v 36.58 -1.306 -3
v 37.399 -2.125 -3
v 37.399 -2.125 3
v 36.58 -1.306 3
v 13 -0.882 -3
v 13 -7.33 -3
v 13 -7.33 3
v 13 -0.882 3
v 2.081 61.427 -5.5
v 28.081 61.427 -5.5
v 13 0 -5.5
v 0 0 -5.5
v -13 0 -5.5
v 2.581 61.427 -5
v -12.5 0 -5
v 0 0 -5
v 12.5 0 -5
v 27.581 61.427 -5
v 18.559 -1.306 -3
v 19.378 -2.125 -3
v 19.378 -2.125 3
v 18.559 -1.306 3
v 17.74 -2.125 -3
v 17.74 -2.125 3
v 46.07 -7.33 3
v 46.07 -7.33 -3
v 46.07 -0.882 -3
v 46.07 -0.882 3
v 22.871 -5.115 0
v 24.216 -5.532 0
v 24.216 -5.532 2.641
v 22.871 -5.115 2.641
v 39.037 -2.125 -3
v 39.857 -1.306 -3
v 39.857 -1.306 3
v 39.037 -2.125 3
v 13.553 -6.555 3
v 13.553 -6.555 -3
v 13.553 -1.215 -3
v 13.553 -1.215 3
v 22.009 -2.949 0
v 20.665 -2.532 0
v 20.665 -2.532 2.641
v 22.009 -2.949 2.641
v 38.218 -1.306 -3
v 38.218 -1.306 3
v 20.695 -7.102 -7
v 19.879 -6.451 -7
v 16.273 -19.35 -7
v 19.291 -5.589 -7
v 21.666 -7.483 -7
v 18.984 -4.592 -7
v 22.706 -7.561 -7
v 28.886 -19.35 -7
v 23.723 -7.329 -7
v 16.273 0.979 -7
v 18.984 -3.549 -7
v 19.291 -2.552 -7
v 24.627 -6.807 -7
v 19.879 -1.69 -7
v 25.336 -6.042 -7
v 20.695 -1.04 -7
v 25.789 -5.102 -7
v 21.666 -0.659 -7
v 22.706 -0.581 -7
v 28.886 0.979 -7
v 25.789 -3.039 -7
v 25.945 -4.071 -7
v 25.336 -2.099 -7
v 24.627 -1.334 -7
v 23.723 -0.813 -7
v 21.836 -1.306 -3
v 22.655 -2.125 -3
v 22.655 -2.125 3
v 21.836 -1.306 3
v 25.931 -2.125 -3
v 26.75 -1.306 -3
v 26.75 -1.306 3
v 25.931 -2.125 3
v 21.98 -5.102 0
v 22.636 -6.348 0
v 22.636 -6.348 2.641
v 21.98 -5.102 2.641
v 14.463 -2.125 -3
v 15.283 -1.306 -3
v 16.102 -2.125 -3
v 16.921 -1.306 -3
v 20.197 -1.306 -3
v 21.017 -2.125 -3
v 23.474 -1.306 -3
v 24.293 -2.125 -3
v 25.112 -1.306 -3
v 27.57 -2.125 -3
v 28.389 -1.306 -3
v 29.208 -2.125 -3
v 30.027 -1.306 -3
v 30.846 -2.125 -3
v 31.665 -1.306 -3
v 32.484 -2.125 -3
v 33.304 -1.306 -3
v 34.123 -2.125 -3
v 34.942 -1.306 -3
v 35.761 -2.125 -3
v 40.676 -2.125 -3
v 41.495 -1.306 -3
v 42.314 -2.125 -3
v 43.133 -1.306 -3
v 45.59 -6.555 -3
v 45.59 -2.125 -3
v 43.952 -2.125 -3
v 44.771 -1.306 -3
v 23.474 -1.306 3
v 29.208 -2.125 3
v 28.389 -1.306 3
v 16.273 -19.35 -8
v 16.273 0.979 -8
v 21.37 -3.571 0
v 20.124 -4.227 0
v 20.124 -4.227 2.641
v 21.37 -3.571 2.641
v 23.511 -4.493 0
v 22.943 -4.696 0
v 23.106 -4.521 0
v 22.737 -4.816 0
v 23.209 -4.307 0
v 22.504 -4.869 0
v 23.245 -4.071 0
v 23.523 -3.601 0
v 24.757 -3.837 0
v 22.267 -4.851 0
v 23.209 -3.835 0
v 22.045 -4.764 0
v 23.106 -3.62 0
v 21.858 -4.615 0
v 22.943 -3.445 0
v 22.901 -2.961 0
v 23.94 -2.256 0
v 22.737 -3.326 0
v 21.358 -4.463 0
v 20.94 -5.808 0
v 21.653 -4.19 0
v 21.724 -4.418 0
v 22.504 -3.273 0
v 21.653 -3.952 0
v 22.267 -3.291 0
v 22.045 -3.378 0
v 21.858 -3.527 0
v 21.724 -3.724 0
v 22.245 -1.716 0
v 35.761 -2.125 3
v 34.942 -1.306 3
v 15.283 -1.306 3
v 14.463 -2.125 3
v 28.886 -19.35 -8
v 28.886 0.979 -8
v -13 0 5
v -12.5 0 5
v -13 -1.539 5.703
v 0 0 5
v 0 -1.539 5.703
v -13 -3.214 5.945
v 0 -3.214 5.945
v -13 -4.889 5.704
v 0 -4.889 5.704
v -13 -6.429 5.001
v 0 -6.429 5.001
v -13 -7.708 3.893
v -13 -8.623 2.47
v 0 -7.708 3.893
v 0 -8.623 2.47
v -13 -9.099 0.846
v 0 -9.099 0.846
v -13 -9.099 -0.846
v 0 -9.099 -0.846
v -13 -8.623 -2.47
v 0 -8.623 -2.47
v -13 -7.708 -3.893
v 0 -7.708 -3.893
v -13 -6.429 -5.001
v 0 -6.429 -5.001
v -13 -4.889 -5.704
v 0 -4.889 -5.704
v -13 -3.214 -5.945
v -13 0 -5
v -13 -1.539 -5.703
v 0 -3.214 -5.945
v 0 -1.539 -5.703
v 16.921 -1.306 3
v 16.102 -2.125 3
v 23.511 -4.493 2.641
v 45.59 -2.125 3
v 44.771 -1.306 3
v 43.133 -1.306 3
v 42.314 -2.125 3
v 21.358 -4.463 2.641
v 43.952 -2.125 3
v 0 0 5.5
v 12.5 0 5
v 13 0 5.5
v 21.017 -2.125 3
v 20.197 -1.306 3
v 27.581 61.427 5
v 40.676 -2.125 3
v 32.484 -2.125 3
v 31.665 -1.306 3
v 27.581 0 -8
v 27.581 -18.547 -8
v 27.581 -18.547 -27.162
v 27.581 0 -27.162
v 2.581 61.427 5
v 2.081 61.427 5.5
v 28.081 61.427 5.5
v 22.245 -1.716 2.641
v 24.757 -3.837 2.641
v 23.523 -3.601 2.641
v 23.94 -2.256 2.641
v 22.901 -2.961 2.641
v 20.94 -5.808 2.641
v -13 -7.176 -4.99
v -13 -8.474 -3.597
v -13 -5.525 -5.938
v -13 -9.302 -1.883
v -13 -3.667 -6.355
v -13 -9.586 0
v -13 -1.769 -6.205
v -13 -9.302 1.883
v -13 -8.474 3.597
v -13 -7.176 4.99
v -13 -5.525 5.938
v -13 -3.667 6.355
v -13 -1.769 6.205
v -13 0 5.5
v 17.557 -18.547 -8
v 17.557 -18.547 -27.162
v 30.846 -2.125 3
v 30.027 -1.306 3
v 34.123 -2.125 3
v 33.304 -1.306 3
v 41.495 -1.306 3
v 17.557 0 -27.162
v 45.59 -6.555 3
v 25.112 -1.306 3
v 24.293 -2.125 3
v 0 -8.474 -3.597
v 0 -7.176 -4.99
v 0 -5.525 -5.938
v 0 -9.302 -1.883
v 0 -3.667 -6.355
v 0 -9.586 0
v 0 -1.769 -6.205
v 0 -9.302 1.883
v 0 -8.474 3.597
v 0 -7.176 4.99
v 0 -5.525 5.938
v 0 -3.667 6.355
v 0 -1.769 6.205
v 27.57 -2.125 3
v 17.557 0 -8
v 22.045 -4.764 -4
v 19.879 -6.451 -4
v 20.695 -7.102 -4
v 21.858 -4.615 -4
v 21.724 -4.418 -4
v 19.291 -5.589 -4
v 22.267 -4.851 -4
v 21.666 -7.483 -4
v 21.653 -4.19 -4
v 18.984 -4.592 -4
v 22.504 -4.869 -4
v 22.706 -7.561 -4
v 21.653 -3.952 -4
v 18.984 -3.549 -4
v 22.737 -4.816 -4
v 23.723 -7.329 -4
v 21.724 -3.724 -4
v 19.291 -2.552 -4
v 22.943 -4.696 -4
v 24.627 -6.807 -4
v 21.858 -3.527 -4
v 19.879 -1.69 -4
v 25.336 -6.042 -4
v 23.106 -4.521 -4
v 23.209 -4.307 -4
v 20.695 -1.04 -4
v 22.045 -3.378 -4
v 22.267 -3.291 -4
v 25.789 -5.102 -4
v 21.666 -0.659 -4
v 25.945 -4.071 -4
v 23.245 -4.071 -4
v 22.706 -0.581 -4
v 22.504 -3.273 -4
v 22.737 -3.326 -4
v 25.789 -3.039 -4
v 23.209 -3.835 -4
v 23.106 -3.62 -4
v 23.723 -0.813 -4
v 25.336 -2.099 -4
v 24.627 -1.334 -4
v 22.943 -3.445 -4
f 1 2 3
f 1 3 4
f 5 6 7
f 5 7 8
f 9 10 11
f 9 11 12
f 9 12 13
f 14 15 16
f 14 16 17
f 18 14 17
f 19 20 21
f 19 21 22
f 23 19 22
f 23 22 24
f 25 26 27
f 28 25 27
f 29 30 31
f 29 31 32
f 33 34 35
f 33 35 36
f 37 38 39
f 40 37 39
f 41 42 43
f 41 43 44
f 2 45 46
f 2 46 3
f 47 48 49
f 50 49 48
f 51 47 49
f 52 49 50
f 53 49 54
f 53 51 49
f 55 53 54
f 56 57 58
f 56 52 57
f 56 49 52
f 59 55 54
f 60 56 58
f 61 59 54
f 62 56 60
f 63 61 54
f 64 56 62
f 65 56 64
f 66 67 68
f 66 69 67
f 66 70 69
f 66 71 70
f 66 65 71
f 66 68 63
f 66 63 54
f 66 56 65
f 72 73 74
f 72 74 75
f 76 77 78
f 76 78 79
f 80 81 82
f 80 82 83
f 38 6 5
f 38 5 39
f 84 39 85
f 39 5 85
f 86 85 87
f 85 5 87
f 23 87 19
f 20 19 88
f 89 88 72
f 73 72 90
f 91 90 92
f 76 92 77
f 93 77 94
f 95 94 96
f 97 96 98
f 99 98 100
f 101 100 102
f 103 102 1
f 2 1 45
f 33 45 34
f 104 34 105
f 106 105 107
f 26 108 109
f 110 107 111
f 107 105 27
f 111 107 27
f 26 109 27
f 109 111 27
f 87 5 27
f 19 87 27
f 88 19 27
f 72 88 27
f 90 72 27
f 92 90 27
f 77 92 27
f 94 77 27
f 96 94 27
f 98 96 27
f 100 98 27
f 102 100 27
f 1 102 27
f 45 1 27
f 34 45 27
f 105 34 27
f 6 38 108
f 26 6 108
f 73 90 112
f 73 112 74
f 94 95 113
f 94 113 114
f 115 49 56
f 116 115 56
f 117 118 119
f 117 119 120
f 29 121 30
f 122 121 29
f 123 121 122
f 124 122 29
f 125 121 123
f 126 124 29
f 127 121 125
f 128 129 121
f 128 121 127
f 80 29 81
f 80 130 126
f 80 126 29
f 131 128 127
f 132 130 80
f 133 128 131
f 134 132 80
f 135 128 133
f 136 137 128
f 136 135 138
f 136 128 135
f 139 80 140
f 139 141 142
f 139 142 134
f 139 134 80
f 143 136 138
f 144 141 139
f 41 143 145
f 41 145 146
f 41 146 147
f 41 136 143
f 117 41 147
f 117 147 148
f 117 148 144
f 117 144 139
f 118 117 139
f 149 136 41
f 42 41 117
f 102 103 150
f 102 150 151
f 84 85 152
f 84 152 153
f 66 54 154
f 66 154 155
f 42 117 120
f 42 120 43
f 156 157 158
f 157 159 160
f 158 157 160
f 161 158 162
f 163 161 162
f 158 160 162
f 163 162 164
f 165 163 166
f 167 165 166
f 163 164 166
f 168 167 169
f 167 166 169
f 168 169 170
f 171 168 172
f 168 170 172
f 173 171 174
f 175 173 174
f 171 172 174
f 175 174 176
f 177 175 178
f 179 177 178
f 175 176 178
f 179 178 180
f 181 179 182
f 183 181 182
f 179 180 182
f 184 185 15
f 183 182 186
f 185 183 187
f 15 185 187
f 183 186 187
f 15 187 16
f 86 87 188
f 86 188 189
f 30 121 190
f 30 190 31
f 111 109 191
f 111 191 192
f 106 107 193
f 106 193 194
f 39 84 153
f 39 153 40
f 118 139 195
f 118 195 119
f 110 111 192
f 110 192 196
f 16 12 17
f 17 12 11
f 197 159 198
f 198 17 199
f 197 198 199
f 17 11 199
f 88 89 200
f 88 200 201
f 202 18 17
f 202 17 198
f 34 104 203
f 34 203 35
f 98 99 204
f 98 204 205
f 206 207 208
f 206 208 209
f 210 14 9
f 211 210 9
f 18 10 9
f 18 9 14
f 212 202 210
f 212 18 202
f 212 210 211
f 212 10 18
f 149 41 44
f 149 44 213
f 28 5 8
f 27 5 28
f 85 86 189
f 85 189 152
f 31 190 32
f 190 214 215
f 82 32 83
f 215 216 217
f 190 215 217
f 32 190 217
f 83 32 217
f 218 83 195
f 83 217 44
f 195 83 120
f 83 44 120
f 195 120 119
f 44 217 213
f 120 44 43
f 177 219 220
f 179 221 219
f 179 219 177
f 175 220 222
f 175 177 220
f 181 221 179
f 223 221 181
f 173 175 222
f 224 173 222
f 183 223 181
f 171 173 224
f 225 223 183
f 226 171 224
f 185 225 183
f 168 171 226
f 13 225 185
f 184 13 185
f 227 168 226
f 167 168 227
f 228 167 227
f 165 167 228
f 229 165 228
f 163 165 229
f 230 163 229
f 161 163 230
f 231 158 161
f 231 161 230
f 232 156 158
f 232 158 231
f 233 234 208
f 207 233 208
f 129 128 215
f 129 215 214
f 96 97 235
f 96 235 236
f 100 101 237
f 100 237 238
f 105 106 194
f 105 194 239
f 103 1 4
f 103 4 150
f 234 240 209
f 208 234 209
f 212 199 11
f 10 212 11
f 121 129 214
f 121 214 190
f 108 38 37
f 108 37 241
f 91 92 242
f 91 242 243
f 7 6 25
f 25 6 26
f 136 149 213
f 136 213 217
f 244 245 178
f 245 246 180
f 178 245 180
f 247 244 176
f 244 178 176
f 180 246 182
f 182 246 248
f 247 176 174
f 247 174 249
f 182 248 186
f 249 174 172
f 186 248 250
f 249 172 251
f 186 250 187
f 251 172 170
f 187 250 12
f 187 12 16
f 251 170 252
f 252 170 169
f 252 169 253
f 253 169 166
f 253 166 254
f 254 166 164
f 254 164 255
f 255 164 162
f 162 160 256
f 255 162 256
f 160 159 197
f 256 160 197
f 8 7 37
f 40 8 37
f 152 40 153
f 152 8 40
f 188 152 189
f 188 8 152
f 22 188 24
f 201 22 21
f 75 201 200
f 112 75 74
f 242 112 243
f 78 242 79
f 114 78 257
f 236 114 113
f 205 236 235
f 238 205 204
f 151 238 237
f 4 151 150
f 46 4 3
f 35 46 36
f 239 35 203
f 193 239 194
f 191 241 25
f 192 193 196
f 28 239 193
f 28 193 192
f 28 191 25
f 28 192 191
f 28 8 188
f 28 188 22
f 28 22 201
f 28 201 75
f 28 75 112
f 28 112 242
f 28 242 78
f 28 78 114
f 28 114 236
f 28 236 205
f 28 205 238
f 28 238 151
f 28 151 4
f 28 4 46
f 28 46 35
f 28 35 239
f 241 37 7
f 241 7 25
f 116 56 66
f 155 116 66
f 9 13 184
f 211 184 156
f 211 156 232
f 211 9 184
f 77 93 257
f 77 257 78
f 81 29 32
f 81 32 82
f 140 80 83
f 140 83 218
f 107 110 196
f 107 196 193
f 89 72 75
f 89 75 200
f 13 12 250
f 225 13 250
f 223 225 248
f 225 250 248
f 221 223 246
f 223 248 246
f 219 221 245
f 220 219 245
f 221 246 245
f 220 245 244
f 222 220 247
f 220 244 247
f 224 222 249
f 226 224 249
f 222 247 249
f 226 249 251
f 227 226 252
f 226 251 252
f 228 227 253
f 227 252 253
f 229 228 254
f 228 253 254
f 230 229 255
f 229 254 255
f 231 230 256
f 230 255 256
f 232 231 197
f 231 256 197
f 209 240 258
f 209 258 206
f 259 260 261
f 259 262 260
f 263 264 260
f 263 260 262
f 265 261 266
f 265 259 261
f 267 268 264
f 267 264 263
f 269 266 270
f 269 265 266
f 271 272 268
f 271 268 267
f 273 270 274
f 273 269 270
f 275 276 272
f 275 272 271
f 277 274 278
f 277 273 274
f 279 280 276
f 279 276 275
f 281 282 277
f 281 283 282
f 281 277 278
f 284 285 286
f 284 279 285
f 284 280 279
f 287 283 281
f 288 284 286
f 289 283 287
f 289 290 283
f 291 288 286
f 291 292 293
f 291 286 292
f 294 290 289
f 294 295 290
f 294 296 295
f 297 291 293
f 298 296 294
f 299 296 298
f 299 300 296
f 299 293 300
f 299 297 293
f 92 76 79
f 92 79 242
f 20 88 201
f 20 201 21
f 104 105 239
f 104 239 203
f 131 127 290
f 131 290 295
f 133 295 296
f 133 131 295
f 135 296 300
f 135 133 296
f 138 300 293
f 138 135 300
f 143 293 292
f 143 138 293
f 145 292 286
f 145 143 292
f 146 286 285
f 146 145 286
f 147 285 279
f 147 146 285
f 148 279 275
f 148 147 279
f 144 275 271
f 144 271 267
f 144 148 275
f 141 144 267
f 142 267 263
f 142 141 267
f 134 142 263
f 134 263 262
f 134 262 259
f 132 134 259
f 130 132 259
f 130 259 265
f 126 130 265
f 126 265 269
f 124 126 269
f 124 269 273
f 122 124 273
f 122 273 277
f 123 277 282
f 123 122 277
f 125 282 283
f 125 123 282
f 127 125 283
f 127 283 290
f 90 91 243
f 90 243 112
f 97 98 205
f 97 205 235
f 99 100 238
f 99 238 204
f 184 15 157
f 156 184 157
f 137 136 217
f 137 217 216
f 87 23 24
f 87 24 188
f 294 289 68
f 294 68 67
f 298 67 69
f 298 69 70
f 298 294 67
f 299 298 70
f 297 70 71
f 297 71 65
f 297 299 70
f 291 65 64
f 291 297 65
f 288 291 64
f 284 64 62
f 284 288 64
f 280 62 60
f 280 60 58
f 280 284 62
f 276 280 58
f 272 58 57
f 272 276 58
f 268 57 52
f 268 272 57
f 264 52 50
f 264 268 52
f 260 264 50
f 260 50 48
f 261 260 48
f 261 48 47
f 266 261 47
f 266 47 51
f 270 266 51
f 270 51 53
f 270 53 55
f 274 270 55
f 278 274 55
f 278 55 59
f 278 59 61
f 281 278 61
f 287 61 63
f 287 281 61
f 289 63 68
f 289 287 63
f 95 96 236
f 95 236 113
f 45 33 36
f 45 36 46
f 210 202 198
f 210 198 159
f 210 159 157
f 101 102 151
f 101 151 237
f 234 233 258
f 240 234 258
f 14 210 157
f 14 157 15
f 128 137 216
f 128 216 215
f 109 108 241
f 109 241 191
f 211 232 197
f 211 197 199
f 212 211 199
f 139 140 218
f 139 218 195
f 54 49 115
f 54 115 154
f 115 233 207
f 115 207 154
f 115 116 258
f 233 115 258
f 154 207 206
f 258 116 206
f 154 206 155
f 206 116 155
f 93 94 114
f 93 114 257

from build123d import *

# Parameters (mm, degrees)
SKETCH_1_W           = 26
SKETCH_1_H           = 11
SKETCH_1_W_2         = 25
SKETCH_1_H_2         = 10
EXTRUDE_1_DEPTH      = 13
EXTRUDE_3_DEPTH      = 3
EXTRUDE_3_DEPTH_BACK = 3
SKETCH_6_W           = 33.070370948
SKETCH_6_H           = 6.448093374
EXTRUDE_11_DEPTH     = 2.641307104
SKETCH_9_R           = 0.8
EXTRUDE_12_DEPTH     = 4
EXTRUDE_START        = -4
SKETCH_10_R          = 3.5
EXTRUDE_13_DEPTH     = 3
EXTRUDE_START_2      = -7
SKETCH_11_W          = 12.612855994
SKETCH_11_H          = 20.328900567
EXTRUDE_14_DEPTH     = 1
EXTRUDE_START_3      = -8
SKETCH_12_W          = 10.024040608
SKETCH_12_H          = 18.546773162
EXTRUDE_15_DEPTH     = 19.16229195


with BuildPart() as part:
    # 扫描1: sweep along a path in 草图2
    with BuildLine(Plane.XY) as sweep_1_path:
        Line((0, 0), (15.081446117, 61.427097956))
    # 草图1 → 扫描1 (sweep)
    with BuildSketch(Plane(origin=(0, 0, 0), x_dir=(1, 0, 0), z_dir=(0, 1, 0))):
        Rectangle(SKETCH_1_W, SKETCH_1_H)
        Rectangle(SKETCH_1_W_2, SKETCH_1_H_2, mode=Mode.SUBTRACT)
    sweep(path=sweep_1_path.line)

    # 草图3 → 凸台-拉伸1 (add)
    with BuildSketch(Plane(origin=(0, 0, 0), x_dir=(0, 0, -1), z_dir=(1, 0, 0))):
        with BuildLine():
            Line((-5.5, 0), (-5, 0))
            ThreePointArc((-5, 0), (0, -9.160017332), (5, 0))
            Line((5, 0), (5.5, 0))
            ThreePointArc((5.5, 0), (0, -9.586307333), (-5.5, 0))
        make_face()
    extrude(amount=-EXTRUDE_1_DEPTH)


with BuildPart() as body_2:
    # 草图6 → 凸台-拉伸3 (new, two sides: drawn at the far end of the back side and taken through both)
    with BuildSketch(Plane.XY.offset(-EXTRUDE_3_DEPTH_BACK)):
        with Locations((29.535185474, -4.106366023)):
            Rectangle(SKETCH_6_W, SKETCH_6_H)
        Polygon((13.553337787, -2.125143793), (13.553337787, -6.554523321), (45.590493828, -6.554523321), (45.590493828, -2.125143793), (44.771361998, -1.306011962), (43.952230167, -2.125143793), (43.133098336, -1.306011962), (42.313966506, -2.125143793), (41.494834675, -1.306011962), (40.675702845, -2.125143793), (39.856571014, -1.306011962), (39.037439183, -2.125143793), (38.218307353, -1.306011962), (37.399175522, -2.125143793), (36.580043692, -1.306011962), (35.760911861, -2.125143793), (34.94178003, -1.306011962), (34.1226482, -2.125143793), (33.303516369, -1.306011962), (32.484384538, -2.125143793), (31.665252708, -1.306011962), (30.846120877, -2.125143793), (30.026989047, -1.306011962), (29.207857216, -2.125143793), (28.388725385, -1.306011962), (27.569593555, -2.125143793), (26.750461724, -1.306011962), (25.931329894, -2.125143793), (25.112198063, -1.306011962), (24.293066232, -2.125143793), (23.473934402, -1.306011962), (22.654802571, -2.125143793), (21.835670741, -1.306011962), (21.01653891, -2.125143793), (20.197407079, -1.306011962), (19.378275249, -2.125143793), (18.559143418, -1.306011962), (17.740011588, -2.125143793), (16.920879757, -1.306011962), (16.101747926, -2.125143793), (15.282616096, -1.306011962), (14.463484265, -2.125143793), (13.553337787, -1.214997314), align=None, mode=Mode.SUBTRACT)
    extrude(amount=EXTRUDE_3_DEPTH + EXTRUDE_3_DEPTH_BACK)


with BuildPart() as body_3:
    # 草图7 → 凸台-拉伸11 (new body)
    with BuildSketch(Plane.XY):
        Polygon((22.245236656, -1.715577878), (22.901203318, -2.961488175), (23.940247657, -2.256017546), (23.523094513, -3.600847641), (24.756652876, -3.836719874), (23.510742579, -4.492686537), (24.216213207, -5.531730876), (22.871383112, -5.114577731), (22.635510879, -6.348136094), (21.979544217, -5.102225797), (20.940499878, -5.807696426), (21.357653022, -4.462866331), (20.124094659, -4.226994098), (21.370004956, -3.571027435), (20.664534328, -2.531983096), (22.009364423, -2.949136241), align=None)
    extrude(amount=EXTRUDE_11_DEPTH)

    # 草图9 → 凸台-拉伸12 (add)
    with BuildSketch(Plane.XY):
        with Locations((22.444532426, -4.070813094)):
            Circle(SKETCH_9_R)
    extrude(amount=-EXTRUDE_12_DEPTH)

    # 草图10 → 凸台-拉伸13 (add)
    with BuildSketch(Plane.XY.offset(EXTRUDE_START)):
        with Locations((22.444532426, -4.070813094)):
            Circle(SKETCH_10_R)
    extrude(amount=-EXTRUDE_13_DEPTH)

    # 草图11 → 凸台-拉伸14 (add)
    with BuildSketch(Plane.XY.offset(EXTRUDE_START_2)):
        with Locations((22.579748606, -9.185183134)):
            Rectangle(SKETCH_11_W, SKETCH_11_H)
    extrude(amount=-EXTRUDE_14_DEPTH)

    # 草图12 → 凸台-拉伸15 (add)
    with BuildSketch(Plane.XY.offset(EXTRUDE_START_3)):
        with Locations((22.568813032, -9.273386581)):
            Rectangle(SKETCH_12_W, SKETCH_12_H)
    extrude(amount=-EXTRUDE_15_DEPTH)


solid = Compound([part.part, body_2.part, body_3.part])
